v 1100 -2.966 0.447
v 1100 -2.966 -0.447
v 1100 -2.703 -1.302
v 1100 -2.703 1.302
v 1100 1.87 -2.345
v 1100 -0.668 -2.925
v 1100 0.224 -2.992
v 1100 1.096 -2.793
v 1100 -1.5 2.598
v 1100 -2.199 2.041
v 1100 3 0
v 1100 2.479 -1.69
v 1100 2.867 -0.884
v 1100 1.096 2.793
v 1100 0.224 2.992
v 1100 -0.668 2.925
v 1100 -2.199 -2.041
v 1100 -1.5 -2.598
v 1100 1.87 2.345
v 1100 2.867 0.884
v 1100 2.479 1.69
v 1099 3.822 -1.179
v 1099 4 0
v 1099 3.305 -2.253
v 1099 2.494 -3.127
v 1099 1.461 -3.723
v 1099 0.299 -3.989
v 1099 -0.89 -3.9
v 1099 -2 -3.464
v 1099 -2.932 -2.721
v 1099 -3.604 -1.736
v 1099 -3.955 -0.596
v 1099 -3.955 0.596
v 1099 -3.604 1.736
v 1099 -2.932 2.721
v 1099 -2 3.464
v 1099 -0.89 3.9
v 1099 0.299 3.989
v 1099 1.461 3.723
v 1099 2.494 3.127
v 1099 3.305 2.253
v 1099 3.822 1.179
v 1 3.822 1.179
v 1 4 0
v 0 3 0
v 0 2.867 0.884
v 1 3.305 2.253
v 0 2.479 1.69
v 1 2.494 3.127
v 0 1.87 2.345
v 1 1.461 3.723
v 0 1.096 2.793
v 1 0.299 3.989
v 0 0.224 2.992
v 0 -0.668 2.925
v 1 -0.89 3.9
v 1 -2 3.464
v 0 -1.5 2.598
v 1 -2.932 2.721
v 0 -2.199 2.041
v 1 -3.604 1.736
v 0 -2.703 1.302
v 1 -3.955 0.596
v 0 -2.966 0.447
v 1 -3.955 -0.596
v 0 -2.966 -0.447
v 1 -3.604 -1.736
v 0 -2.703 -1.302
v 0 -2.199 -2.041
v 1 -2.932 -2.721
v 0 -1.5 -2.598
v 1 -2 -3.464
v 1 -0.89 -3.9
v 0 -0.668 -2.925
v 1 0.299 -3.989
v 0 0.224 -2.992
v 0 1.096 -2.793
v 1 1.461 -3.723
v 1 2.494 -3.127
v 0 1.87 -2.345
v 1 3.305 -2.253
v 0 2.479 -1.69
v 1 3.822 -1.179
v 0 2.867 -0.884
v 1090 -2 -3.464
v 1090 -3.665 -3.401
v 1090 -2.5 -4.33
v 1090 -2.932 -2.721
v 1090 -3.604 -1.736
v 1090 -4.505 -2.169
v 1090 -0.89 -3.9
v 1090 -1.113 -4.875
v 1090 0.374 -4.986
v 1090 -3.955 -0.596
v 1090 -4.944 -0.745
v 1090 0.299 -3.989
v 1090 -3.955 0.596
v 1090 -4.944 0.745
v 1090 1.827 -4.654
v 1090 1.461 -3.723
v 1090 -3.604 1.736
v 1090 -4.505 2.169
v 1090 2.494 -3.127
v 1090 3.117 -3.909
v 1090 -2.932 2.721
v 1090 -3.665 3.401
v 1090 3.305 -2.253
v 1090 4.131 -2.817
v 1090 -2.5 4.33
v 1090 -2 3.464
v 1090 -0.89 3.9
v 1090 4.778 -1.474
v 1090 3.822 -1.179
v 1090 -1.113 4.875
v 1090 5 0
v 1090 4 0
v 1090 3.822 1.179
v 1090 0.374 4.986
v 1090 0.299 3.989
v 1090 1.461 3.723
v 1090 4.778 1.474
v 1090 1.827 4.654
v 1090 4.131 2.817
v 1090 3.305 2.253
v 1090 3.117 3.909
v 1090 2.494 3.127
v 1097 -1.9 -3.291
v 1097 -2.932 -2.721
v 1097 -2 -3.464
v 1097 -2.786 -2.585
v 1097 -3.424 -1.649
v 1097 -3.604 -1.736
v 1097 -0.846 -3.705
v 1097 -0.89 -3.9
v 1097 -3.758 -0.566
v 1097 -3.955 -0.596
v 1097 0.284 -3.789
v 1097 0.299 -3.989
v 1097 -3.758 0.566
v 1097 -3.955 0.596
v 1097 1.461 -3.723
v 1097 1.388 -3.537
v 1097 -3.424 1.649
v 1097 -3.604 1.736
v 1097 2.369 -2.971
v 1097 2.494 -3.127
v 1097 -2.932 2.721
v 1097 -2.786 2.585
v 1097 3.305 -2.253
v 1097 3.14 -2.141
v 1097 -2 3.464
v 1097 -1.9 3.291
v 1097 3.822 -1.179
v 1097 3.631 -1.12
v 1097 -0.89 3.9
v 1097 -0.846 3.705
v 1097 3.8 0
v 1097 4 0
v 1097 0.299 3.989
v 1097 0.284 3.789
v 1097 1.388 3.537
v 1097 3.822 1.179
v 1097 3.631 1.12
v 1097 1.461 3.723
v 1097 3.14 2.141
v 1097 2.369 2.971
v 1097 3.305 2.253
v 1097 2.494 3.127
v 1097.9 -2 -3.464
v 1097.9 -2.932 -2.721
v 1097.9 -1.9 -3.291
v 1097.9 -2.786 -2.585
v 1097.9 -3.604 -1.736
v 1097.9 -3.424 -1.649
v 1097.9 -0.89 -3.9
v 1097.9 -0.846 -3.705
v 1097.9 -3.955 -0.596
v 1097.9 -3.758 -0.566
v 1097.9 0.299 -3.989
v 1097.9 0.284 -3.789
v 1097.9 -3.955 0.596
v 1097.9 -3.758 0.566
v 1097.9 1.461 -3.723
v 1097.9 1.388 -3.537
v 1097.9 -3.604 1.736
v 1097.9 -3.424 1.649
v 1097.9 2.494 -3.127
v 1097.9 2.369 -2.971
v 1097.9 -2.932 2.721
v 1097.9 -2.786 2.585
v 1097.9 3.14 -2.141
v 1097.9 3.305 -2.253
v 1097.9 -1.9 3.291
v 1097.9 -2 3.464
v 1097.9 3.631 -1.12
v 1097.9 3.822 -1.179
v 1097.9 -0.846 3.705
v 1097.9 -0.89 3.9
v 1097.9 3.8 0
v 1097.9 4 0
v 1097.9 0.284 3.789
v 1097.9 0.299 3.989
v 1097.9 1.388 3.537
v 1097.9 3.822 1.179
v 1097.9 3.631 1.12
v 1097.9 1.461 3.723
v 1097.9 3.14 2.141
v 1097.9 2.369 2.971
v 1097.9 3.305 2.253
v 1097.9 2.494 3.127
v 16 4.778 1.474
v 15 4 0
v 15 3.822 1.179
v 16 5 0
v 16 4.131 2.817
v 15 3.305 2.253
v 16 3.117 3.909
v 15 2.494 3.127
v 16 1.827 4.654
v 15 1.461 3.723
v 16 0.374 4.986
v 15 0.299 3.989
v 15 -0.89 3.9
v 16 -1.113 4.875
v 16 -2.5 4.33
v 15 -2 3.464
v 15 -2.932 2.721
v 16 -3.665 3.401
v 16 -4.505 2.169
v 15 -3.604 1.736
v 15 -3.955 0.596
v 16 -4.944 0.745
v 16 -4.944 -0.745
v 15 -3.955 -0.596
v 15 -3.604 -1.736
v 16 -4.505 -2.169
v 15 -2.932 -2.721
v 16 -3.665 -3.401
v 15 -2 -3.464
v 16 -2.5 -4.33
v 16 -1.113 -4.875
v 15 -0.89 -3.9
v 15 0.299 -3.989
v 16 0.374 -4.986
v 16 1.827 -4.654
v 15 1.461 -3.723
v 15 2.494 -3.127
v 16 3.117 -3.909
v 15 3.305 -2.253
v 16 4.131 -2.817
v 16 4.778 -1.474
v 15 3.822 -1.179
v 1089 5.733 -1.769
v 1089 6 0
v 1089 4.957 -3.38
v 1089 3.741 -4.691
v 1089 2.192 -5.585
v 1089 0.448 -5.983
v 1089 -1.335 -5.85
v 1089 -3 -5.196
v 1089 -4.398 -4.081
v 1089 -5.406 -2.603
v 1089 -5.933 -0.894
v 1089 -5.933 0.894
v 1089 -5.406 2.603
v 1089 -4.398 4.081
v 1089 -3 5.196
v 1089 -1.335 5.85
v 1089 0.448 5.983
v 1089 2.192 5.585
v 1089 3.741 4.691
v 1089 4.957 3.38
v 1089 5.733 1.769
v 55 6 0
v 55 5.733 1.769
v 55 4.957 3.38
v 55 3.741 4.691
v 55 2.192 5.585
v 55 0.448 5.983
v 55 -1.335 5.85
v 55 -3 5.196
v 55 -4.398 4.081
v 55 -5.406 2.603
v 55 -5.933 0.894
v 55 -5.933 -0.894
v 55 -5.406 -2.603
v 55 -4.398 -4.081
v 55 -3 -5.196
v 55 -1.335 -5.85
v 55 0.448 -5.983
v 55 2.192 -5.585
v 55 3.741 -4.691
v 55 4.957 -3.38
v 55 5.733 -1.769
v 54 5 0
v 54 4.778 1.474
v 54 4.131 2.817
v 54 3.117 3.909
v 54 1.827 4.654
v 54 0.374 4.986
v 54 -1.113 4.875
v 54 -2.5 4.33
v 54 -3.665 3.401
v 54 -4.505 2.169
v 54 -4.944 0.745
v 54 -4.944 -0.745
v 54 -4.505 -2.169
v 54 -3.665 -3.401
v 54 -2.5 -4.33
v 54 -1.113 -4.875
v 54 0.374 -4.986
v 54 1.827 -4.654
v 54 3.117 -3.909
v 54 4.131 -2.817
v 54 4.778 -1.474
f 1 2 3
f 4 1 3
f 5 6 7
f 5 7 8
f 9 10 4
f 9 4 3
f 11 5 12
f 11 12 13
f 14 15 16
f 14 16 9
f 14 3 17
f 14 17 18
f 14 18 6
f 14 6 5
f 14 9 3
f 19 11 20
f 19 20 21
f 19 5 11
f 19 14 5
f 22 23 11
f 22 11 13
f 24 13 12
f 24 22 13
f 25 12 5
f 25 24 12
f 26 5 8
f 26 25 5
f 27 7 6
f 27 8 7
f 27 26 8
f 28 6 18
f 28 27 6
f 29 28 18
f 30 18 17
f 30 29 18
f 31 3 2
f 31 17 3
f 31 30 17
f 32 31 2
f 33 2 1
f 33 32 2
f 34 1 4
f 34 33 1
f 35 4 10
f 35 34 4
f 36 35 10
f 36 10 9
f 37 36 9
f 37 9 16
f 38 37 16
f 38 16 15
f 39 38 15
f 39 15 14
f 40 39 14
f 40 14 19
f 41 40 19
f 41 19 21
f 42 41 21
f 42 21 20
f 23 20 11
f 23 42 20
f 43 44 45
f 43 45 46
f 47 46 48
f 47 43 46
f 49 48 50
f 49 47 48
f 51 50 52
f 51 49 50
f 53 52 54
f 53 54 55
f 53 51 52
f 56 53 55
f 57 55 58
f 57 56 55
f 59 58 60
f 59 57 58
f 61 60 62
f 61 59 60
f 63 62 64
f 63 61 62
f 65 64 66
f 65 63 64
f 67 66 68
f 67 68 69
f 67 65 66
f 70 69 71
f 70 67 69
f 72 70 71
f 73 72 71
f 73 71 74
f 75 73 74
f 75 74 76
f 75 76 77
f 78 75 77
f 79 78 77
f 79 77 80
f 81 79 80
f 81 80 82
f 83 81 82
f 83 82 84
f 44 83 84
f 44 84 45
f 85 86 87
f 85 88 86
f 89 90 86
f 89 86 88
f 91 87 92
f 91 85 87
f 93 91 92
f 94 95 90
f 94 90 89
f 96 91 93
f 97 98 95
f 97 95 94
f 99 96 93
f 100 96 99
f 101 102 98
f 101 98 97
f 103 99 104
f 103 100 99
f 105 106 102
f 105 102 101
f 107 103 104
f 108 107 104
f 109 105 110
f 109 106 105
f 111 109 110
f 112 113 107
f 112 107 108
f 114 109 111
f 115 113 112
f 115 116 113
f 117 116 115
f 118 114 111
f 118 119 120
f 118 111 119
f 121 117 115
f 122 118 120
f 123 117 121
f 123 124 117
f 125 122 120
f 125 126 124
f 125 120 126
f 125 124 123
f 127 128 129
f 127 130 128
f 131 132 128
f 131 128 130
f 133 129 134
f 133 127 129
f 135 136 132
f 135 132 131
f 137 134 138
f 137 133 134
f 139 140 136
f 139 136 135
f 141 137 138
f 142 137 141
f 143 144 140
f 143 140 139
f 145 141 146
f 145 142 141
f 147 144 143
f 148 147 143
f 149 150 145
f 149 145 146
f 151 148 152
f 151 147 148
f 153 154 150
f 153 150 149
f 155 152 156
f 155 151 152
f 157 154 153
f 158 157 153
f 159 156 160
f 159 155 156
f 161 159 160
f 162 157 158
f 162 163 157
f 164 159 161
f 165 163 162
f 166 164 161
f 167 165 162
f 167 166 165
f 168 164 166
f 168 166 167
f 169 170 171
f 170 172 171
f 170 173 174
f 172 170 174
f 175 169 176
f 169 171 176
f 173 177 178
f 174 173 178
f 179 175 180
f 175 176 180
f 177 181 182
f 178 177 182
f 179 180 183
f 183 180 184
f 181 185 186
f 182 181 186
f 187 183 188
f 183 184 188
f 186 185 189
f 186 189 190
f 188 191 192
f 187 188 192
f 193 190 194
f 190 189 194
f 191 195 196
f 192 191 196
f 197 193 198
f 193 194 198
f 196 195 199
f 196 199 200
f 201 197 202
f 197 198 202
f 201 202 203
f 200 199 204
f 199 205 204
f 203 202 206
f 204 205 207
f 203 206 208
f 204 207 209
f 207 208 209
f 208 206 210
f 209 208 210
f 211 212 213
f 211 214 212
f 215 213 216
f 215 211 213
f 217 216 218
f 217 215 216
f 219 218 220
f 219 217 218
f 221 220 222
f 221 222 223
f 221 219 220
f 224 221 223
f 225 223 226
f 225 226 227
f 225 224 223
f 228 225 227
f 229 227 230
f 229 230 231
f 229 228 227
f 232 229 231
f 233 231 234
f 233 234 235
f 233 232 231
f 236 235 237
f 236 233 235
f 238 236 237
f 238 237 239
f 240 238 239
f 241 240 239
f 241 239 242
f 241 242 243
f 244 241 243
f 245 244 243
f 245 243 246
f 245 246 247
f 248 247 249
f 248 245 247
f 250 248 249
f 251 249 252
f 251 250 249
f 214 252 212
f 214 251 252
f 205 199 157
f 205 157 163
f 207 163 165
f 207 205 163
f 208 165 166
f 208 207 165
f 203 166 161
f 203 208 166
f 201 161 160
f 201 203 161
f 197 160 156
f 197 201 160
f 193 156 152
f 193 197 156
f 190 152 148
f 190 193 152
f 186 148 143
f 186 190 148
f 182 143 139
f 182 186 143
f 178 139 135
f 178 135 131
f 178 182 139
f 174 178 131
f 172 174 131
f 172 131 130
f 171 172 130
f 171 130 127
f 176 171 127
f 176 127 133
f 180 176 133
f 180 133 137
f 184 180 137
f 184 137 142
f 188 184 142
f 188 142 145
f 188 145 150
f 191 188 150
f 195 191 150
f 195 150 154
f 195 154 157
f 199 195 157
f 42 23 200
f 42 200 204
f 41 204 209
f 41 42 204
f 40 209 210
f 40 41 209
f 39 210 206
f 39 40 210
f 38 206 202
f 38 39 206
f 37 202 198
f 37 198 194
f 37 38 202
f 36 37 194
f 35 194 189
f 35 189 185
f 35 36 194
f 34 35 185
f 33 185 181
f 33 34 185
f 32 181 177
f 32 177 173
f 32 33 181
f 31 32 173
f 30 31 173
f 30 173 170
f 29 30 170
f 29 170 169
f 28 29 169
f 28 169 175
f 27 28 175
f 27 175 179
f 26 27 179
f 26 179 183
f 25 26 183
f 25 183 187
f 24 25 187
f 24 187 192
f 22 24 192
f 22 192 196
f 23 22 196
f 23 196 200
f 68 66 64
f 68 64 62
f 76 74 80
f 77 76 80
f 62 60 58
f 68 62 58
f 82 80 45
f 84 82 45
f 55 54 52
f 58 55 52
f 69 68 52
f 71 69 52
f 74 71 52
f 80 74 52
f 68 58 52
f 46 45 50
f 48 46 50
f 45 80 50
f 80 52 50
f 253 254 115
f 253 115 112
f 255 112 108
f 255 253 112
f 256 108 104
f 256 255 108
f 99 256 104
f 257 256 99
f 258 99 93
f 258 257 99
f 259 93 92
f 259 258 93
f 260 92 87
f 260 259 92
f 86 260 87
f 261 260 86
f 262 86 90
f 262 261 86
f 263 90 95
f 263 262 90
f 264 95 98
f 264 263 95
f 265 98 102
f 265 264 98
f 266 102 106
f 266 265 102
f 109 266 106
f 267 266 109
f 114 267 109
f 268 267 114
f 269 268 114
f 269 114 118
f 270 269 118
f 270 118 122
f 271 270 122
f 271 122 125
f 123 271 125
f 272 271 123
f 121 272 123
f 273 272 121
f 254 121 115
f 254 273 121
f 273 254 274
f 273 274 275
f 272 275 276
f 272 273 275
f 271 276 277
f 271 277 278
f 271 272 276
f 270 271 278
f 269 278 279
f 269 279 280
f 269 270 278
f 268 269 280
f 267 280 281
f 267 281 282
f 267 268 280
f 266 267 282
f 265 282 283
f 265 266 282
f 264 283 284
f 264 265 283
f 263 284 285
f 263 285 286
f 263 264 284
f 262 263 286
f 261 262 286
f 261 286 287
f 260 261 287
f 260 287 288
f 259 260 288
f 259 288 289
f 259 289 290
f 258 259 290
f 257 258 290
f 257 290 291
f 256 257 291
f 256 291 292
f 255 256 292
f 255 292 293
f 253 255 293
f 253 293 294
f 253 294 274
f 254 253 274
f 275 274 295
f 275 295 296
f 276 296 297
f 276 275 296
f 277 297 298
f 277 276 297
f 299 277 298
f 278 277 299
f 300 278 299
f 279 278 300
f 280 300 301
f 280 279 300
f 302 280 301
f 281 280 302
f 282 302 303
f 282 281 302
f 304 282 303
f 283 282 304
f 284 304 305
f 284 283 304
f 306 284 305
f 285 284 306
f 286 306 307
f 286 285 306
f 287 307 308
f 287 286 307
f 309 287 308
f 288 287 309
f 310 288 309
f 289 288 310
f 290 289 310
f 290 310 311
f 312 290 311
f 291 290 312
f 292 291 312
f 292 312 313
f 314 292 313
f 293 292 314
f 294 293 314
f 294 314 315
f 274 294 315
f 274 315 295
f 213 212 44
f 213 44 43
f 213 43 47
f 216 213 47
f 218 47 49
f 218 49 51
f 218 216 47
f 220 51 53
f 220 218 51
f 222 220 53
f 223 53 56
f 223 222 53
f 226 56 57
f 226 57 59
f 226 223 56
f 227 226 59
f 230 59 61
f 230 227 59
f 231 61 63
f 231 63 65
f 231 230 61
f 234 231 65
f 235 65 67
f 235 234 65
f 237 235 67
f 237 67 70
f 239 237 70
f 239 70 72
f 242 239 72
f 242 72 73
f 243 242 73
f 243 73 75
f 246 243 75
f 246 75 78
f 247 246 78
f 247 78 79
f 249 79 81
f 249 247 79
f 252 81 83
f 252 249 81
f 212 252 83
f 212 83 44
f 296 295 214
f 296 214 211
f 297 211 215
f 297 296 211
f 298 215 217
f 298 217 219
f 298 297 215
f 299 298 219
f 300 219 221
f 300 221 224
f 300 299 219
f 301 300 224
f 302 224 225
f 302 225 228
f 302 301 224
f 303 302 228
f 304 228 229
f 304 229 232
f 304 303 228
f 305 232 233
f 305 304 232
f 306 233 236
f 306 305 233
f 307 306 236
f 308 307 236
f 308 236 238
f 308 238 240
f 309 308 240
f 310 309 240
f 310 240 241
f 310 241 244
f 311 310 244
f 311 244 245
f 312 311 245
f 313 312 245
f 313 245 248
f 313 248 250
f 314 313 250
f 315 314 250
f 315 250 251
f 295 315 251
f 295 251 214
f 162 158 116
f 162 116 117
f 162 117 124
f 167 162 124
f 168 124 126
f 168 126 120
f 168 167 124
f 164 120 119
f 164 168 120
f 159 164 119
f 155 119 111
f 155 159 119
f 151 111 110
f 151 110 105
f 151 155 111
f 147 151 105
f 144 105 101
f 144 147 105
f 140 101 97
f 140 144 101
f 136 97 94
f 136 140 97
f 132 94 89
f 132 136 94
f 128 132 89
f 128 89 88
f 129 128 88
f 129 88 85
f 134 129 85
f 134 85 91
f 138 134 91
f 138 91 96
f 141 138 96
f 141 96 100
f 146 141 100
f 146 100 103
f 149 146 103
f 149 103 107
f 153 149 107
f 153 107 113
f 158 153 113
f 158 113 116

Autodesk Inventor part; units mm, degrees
ref_plane "YZ Plane" through (0, 0, 0) normal (1, 0, 0) x (0, 1, 0)
ref_plane "XZ Plane" through (0, 0, 0) normal (0, 1, 0) x (-1, 0, 0)
ref_plane "XY Plane" through (0, 0, 0) normal (0, 0, 1) x (1, 0, 0)
sketch "Sketch1" plane through (0, 0, 0) normal (0, 0, 1) x (1, 0, 0)
  line L0 (0, 4) -> (1, 4) construction
  line L1 (15, 4) -> (16, 5)
  line L2 (16, 5) -> (54, 5)
  line L3 (0, 4) -> (0, 3) construction
  line L4 (54, 5) -> (55, 6)
  line L5 (55, 6) -> (1089, 6)
  line L6 (0, 3) -> (1, 4)
  line L7 (0, 3) -> (0, 0)
  line L8 (1, 4) -> (15, 4)
  line L9 (1089, 6) -> (1090, 5)
  line L10 (1090, 5) -> (1090, 4)
  line L11 (1090, 4) -> (1097, 4)
  line L12 (1097, 4) -> (1097, 3.8)
  line L13 (1097, 3.8) -> (1097.9, 3.8)
  line L14 (1097.9, 3.8) -> (1097.9, 4)
  line L15 (1097.9, 4) -> (1099, 4)
  line L16 (1099, 4) -> (1100, 3)
  line L17 (1100, 3) -> (1100, 0)
  line L18 (0, 0) -> (1100, 0)
  point P0 (0, 0)
  point P1 (1100, 1.5)
  dimension "d0" = 4
  dimension "d1" = 5
  dimension "d2" = 6
  dimension "d3" = 135
  dimension "d4" = 135
  dimension "d5" = 15
  dimension "d6" = 39
  dimension "d7" = 135
  dimension "d8" = 4
  dimension "d9" = 7
  dimension "d10" = 10
  dimension "d11" = 0.2
  dimension "d12" = 0.9
  dimension "d14" = 135
  dimension "d15" = 1100
revolve "Revolution1" add sketch "Sketch1" angle 360 about axis through (0, 0, 0) along (1, 0, 0)
equation "\"d15\" = SHAFT_LEN"
equation "\"SHAFT_LEN\" = 1100"
properties part number "SFU1204-800"
